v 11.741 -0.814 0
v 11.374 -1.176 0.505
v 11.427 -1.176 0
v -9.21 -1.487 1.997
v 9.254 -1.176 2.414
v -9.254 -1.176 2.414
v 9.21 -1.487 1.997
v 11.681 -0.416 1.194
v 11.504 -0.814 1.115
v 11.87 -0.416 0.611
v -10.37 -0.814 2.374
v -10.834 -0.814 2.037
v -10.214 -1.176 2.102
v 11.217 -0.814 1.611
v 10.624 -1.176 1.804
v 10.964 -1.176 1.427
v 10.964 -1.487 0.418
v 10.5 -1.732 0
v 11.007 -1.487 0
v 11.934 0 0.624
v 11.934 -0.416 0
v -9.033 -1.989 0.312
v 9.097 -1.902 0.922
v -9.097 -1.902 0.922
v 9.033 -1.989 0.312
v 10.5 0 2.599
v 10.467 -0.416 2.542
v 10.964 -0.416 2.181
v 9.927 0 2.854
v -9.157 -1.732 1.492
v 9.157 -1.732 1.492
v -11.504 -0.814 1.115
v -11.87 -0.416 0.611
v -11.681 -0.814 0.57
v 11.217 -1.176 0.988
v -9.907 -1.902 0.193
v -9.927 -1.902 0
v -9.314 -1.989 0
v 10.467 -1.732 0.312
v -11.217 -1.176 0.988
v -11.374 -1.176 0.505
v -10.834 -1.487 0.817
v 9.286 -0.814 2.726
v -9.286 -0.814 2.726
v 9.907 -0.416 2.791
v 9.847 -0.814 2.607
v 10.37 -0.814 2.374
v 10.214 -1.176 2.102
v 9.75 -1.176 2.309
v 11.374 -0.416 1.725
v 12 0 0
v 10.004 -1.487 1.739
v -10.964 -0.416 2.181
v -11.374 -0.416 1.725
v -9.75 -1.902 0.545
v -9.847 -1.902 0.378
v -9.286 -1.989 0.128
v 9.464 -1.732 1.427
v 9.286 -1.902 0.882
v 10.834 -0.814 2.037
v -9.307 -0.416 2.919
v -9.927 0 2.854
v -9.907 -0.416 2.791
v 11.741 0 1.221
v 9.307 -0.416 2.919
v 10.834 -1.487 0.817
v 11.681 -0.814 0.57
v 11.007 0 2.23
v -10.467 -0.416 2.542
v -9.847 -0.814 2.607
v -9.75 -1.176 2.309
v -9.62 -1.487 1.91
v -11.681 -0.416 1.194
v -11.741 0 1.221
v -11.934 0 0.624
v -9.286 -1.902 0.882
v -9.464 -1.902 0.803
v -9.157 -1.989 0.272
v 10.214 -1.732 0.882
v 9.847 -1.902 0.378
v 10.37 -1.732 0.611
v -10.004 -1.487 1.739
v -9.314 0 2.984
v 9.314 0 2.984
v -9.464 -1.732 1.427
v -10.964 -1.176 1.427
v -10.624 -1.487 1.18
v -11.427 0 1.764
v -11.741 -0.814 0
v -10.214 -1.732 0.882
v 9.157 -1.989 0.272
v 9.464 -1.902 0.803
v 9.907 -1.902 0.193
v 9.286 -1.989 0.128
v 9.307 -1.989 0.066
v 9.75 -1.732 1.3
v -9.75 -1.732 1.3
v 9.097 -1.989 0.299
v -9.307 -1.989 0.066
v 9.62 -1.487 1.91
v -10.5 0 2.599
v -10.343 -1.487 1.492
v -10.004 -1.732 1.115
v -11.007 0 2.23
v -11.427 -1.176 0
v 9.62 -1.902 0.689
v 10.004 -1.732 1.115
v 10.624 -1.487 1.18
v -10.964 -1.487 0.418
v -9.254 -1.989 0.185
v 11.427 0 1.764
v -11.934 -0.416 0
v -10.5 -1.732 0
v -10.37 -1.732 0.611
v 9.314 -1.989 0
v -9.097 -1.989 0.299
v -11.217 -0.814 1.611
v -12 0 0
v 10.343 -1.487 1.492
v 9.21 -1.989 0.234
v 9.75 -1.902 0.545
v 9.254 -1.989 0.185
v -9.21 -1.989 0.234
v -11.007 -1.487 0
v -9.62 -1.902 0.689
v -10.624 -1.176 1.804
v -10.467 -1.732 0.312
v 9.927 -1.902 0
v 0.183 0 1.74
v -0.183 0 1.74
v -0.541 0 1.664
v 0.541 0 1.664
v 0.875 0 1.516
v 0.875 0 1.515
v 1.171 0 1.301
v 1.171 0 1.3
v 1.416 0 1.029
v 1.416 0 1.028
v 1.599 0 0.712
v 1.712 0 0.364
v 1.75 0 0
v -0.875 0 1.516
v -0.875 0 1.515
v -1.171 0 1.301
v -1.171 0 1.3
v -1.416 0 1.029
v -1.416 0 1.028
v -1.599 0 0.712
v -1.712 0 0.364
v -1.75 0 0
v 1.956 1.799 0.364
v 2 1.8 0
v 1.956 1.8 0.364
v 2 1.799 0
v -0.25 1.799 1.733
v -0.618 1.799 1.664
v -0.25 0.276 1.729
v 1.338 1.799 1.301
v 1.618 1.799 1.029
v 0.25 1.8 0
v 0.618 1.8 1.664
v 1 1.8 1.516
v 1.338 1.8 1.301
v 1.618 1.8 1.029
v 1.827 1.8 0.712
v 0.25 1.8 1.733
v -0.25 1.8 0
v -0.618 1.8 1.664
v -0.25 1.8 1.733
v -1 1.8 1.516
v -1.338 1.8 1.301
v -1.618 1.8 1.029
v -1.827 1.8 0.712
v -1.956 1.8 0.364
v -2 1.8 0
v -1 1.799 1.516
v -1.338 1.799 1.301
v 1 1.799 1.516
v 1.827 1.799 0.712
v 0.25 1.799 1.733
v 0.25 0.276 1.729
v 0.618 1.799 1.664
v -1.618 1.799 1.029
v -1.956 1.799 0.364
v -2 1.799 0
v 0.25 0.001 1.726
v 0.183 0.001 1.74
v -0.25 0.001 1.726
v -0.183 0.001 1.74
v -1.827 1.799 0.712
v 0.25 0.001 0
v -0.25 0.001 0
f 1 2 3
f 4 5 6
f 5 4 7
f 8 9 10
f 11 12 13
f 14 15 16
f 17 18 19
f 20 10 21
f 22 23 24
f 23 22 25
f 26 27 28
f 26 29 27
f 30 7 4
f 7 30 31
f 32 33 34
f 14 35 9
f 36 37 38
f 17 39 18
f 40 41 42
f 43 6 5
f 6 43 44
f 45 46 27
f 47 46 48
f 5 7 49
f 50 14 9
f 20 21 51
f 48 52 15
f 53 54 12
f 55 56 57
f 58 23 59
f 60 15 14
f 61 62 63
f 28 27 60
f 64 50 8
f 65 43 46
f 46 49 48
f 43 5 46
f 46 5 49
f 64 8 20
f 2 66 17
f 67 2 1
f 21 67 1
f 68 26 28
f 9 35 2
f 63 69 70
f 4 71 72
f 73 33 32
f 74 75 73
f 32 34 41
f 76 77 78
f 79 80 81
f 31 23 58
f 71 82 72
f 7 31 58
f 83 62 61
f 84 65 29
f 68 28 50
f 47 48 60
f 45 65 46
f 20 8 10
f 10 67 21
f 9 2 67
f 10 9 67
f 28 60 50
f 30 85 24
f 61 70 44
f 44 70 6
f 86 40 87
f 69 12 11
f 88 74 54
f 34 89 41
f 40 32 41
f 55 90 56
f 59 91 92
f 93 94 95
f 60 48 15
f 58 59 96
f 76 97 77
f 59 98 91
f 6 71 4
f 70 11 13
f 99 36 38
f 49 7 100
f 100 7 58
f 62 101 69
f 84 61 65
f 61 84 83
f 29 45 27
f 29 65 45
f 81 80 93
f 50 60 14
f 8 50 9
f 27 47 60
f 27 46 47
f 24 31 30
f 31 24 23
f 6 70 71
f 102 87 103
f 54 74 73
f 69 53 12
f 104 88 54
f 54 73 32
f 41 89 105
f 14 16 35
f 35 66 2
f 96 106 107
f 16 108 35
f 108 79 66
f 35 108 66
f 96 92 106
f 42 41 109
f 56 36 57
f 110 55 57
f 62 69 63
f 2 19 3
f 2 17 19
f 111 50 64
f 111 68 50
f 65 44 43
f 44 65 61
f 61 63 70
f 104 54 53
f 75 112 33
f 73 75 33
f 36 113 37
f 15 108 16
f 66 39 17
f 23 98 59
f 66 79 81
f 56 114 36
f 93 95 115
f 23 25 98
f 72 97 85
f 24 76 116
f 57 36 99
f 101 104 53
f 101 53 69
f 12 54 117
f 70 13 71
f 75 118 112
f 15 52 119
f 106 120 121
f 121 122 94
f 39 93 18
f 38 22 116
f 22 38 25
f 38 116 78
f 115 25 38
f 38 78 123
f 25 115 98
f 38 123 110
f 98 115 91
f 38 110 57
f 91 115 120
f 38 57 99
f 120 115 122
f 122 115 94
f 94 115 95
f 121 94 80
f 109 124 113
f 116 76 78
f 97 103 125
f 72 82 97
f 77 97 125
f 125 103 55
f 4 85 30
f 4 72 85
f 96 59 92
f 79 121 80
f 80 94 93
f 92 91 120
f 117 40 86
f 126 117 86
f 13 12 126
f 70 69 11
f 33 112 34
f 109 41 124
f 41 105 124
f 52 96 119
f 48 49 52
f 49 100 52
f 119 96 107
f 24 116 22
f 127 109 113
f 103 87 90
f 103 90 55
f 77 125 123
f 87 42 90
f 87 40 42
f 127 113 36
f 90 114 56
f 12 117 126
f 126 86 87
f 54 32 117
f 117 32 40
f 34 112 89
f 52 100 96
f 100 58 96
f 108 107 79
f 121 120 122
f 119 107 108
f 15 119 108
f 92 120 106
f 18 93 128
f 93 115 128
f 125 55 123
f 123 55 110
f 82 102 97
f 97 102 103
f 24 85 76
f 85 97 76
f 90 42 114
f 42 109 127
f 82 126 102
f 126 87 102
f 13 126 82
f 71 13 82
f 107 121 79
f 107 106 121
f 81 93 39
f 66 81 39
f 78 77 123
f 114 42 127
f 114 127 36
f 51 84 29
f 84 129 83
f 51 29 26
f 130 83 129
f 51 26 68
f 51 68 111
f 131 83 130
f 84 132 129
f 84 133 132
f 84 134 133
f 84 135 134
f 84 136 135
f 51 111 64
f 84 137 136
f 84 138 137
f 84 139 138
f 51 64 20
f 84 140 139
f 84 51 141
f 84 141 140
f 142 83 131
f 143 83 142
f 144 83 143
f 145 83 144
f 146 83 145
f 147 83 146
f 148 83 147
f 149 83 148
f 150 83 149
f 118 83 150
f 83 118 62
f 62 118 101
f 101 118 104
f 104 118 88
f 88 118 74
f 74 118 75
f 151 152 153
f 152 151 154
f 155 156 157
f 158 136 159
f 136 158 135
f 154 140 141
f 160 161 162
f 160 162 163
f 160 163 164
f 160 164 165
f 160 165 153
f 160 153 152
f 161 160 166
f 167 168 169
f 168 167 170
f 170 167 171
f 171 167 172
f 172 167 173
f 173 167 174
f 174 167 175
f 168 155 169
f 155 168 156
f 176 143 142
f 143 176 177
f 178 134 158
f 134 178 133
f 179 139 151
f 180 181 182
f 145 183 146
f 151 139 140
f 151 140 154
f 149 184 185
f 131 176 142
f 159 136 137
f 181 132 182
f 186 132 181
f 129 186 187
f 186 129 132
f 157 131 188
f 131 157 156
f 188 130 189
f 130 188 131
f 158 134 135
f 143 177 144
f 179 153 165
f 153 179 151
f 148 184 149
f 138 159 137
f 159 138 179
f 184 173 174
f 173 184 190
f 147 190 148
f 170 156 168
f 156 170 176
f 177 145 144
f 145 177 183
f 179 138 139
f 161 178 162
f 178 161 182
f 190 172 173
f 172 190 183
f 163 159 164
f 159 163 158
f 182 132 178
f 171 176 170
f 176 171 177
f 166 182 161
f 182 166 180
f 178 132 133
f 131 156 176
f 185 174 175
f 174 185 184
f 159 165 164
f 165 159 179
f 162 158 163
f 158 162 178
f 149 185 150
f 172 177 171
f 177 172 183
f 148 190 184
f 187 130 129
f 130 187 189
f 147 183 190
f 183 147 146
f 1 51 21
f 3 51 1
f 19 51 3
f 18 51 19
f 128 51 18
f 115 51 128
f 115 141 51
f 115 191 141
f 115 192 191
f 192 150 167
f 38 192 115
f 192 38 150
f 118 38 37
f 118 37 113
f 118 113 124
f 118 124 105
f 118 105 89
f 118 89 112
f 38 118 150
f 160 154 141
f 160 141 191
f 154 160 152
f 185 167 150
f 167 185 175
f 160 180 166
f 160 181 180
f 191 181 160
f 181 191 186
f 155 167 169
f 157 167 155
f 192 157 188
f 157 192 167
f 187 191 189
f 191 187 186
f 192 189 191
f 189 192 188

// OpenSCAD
$fs=.1;
d=3.5;//4;



difference(){
	rotate([90,0,0])union(){
		hull(){
			cylinder(d=d,h=.001);
			translate([0,0,-1.8])scale([(d+.5)/d,1,1])cylinder(d=d,h=.001);
		}
		scale([1,1,2/3])intersection(){
		minkowski(){
			cube([18,.001,.001],center=true);
			sphere(d=6);
		}
		translate([0,0,16])cube(32,center=true);
		}
	}
	translate([0,0,-16])cube(32,center=true);
	translate([-.25,.001,-.001])cube([.5,5,5]);
}
